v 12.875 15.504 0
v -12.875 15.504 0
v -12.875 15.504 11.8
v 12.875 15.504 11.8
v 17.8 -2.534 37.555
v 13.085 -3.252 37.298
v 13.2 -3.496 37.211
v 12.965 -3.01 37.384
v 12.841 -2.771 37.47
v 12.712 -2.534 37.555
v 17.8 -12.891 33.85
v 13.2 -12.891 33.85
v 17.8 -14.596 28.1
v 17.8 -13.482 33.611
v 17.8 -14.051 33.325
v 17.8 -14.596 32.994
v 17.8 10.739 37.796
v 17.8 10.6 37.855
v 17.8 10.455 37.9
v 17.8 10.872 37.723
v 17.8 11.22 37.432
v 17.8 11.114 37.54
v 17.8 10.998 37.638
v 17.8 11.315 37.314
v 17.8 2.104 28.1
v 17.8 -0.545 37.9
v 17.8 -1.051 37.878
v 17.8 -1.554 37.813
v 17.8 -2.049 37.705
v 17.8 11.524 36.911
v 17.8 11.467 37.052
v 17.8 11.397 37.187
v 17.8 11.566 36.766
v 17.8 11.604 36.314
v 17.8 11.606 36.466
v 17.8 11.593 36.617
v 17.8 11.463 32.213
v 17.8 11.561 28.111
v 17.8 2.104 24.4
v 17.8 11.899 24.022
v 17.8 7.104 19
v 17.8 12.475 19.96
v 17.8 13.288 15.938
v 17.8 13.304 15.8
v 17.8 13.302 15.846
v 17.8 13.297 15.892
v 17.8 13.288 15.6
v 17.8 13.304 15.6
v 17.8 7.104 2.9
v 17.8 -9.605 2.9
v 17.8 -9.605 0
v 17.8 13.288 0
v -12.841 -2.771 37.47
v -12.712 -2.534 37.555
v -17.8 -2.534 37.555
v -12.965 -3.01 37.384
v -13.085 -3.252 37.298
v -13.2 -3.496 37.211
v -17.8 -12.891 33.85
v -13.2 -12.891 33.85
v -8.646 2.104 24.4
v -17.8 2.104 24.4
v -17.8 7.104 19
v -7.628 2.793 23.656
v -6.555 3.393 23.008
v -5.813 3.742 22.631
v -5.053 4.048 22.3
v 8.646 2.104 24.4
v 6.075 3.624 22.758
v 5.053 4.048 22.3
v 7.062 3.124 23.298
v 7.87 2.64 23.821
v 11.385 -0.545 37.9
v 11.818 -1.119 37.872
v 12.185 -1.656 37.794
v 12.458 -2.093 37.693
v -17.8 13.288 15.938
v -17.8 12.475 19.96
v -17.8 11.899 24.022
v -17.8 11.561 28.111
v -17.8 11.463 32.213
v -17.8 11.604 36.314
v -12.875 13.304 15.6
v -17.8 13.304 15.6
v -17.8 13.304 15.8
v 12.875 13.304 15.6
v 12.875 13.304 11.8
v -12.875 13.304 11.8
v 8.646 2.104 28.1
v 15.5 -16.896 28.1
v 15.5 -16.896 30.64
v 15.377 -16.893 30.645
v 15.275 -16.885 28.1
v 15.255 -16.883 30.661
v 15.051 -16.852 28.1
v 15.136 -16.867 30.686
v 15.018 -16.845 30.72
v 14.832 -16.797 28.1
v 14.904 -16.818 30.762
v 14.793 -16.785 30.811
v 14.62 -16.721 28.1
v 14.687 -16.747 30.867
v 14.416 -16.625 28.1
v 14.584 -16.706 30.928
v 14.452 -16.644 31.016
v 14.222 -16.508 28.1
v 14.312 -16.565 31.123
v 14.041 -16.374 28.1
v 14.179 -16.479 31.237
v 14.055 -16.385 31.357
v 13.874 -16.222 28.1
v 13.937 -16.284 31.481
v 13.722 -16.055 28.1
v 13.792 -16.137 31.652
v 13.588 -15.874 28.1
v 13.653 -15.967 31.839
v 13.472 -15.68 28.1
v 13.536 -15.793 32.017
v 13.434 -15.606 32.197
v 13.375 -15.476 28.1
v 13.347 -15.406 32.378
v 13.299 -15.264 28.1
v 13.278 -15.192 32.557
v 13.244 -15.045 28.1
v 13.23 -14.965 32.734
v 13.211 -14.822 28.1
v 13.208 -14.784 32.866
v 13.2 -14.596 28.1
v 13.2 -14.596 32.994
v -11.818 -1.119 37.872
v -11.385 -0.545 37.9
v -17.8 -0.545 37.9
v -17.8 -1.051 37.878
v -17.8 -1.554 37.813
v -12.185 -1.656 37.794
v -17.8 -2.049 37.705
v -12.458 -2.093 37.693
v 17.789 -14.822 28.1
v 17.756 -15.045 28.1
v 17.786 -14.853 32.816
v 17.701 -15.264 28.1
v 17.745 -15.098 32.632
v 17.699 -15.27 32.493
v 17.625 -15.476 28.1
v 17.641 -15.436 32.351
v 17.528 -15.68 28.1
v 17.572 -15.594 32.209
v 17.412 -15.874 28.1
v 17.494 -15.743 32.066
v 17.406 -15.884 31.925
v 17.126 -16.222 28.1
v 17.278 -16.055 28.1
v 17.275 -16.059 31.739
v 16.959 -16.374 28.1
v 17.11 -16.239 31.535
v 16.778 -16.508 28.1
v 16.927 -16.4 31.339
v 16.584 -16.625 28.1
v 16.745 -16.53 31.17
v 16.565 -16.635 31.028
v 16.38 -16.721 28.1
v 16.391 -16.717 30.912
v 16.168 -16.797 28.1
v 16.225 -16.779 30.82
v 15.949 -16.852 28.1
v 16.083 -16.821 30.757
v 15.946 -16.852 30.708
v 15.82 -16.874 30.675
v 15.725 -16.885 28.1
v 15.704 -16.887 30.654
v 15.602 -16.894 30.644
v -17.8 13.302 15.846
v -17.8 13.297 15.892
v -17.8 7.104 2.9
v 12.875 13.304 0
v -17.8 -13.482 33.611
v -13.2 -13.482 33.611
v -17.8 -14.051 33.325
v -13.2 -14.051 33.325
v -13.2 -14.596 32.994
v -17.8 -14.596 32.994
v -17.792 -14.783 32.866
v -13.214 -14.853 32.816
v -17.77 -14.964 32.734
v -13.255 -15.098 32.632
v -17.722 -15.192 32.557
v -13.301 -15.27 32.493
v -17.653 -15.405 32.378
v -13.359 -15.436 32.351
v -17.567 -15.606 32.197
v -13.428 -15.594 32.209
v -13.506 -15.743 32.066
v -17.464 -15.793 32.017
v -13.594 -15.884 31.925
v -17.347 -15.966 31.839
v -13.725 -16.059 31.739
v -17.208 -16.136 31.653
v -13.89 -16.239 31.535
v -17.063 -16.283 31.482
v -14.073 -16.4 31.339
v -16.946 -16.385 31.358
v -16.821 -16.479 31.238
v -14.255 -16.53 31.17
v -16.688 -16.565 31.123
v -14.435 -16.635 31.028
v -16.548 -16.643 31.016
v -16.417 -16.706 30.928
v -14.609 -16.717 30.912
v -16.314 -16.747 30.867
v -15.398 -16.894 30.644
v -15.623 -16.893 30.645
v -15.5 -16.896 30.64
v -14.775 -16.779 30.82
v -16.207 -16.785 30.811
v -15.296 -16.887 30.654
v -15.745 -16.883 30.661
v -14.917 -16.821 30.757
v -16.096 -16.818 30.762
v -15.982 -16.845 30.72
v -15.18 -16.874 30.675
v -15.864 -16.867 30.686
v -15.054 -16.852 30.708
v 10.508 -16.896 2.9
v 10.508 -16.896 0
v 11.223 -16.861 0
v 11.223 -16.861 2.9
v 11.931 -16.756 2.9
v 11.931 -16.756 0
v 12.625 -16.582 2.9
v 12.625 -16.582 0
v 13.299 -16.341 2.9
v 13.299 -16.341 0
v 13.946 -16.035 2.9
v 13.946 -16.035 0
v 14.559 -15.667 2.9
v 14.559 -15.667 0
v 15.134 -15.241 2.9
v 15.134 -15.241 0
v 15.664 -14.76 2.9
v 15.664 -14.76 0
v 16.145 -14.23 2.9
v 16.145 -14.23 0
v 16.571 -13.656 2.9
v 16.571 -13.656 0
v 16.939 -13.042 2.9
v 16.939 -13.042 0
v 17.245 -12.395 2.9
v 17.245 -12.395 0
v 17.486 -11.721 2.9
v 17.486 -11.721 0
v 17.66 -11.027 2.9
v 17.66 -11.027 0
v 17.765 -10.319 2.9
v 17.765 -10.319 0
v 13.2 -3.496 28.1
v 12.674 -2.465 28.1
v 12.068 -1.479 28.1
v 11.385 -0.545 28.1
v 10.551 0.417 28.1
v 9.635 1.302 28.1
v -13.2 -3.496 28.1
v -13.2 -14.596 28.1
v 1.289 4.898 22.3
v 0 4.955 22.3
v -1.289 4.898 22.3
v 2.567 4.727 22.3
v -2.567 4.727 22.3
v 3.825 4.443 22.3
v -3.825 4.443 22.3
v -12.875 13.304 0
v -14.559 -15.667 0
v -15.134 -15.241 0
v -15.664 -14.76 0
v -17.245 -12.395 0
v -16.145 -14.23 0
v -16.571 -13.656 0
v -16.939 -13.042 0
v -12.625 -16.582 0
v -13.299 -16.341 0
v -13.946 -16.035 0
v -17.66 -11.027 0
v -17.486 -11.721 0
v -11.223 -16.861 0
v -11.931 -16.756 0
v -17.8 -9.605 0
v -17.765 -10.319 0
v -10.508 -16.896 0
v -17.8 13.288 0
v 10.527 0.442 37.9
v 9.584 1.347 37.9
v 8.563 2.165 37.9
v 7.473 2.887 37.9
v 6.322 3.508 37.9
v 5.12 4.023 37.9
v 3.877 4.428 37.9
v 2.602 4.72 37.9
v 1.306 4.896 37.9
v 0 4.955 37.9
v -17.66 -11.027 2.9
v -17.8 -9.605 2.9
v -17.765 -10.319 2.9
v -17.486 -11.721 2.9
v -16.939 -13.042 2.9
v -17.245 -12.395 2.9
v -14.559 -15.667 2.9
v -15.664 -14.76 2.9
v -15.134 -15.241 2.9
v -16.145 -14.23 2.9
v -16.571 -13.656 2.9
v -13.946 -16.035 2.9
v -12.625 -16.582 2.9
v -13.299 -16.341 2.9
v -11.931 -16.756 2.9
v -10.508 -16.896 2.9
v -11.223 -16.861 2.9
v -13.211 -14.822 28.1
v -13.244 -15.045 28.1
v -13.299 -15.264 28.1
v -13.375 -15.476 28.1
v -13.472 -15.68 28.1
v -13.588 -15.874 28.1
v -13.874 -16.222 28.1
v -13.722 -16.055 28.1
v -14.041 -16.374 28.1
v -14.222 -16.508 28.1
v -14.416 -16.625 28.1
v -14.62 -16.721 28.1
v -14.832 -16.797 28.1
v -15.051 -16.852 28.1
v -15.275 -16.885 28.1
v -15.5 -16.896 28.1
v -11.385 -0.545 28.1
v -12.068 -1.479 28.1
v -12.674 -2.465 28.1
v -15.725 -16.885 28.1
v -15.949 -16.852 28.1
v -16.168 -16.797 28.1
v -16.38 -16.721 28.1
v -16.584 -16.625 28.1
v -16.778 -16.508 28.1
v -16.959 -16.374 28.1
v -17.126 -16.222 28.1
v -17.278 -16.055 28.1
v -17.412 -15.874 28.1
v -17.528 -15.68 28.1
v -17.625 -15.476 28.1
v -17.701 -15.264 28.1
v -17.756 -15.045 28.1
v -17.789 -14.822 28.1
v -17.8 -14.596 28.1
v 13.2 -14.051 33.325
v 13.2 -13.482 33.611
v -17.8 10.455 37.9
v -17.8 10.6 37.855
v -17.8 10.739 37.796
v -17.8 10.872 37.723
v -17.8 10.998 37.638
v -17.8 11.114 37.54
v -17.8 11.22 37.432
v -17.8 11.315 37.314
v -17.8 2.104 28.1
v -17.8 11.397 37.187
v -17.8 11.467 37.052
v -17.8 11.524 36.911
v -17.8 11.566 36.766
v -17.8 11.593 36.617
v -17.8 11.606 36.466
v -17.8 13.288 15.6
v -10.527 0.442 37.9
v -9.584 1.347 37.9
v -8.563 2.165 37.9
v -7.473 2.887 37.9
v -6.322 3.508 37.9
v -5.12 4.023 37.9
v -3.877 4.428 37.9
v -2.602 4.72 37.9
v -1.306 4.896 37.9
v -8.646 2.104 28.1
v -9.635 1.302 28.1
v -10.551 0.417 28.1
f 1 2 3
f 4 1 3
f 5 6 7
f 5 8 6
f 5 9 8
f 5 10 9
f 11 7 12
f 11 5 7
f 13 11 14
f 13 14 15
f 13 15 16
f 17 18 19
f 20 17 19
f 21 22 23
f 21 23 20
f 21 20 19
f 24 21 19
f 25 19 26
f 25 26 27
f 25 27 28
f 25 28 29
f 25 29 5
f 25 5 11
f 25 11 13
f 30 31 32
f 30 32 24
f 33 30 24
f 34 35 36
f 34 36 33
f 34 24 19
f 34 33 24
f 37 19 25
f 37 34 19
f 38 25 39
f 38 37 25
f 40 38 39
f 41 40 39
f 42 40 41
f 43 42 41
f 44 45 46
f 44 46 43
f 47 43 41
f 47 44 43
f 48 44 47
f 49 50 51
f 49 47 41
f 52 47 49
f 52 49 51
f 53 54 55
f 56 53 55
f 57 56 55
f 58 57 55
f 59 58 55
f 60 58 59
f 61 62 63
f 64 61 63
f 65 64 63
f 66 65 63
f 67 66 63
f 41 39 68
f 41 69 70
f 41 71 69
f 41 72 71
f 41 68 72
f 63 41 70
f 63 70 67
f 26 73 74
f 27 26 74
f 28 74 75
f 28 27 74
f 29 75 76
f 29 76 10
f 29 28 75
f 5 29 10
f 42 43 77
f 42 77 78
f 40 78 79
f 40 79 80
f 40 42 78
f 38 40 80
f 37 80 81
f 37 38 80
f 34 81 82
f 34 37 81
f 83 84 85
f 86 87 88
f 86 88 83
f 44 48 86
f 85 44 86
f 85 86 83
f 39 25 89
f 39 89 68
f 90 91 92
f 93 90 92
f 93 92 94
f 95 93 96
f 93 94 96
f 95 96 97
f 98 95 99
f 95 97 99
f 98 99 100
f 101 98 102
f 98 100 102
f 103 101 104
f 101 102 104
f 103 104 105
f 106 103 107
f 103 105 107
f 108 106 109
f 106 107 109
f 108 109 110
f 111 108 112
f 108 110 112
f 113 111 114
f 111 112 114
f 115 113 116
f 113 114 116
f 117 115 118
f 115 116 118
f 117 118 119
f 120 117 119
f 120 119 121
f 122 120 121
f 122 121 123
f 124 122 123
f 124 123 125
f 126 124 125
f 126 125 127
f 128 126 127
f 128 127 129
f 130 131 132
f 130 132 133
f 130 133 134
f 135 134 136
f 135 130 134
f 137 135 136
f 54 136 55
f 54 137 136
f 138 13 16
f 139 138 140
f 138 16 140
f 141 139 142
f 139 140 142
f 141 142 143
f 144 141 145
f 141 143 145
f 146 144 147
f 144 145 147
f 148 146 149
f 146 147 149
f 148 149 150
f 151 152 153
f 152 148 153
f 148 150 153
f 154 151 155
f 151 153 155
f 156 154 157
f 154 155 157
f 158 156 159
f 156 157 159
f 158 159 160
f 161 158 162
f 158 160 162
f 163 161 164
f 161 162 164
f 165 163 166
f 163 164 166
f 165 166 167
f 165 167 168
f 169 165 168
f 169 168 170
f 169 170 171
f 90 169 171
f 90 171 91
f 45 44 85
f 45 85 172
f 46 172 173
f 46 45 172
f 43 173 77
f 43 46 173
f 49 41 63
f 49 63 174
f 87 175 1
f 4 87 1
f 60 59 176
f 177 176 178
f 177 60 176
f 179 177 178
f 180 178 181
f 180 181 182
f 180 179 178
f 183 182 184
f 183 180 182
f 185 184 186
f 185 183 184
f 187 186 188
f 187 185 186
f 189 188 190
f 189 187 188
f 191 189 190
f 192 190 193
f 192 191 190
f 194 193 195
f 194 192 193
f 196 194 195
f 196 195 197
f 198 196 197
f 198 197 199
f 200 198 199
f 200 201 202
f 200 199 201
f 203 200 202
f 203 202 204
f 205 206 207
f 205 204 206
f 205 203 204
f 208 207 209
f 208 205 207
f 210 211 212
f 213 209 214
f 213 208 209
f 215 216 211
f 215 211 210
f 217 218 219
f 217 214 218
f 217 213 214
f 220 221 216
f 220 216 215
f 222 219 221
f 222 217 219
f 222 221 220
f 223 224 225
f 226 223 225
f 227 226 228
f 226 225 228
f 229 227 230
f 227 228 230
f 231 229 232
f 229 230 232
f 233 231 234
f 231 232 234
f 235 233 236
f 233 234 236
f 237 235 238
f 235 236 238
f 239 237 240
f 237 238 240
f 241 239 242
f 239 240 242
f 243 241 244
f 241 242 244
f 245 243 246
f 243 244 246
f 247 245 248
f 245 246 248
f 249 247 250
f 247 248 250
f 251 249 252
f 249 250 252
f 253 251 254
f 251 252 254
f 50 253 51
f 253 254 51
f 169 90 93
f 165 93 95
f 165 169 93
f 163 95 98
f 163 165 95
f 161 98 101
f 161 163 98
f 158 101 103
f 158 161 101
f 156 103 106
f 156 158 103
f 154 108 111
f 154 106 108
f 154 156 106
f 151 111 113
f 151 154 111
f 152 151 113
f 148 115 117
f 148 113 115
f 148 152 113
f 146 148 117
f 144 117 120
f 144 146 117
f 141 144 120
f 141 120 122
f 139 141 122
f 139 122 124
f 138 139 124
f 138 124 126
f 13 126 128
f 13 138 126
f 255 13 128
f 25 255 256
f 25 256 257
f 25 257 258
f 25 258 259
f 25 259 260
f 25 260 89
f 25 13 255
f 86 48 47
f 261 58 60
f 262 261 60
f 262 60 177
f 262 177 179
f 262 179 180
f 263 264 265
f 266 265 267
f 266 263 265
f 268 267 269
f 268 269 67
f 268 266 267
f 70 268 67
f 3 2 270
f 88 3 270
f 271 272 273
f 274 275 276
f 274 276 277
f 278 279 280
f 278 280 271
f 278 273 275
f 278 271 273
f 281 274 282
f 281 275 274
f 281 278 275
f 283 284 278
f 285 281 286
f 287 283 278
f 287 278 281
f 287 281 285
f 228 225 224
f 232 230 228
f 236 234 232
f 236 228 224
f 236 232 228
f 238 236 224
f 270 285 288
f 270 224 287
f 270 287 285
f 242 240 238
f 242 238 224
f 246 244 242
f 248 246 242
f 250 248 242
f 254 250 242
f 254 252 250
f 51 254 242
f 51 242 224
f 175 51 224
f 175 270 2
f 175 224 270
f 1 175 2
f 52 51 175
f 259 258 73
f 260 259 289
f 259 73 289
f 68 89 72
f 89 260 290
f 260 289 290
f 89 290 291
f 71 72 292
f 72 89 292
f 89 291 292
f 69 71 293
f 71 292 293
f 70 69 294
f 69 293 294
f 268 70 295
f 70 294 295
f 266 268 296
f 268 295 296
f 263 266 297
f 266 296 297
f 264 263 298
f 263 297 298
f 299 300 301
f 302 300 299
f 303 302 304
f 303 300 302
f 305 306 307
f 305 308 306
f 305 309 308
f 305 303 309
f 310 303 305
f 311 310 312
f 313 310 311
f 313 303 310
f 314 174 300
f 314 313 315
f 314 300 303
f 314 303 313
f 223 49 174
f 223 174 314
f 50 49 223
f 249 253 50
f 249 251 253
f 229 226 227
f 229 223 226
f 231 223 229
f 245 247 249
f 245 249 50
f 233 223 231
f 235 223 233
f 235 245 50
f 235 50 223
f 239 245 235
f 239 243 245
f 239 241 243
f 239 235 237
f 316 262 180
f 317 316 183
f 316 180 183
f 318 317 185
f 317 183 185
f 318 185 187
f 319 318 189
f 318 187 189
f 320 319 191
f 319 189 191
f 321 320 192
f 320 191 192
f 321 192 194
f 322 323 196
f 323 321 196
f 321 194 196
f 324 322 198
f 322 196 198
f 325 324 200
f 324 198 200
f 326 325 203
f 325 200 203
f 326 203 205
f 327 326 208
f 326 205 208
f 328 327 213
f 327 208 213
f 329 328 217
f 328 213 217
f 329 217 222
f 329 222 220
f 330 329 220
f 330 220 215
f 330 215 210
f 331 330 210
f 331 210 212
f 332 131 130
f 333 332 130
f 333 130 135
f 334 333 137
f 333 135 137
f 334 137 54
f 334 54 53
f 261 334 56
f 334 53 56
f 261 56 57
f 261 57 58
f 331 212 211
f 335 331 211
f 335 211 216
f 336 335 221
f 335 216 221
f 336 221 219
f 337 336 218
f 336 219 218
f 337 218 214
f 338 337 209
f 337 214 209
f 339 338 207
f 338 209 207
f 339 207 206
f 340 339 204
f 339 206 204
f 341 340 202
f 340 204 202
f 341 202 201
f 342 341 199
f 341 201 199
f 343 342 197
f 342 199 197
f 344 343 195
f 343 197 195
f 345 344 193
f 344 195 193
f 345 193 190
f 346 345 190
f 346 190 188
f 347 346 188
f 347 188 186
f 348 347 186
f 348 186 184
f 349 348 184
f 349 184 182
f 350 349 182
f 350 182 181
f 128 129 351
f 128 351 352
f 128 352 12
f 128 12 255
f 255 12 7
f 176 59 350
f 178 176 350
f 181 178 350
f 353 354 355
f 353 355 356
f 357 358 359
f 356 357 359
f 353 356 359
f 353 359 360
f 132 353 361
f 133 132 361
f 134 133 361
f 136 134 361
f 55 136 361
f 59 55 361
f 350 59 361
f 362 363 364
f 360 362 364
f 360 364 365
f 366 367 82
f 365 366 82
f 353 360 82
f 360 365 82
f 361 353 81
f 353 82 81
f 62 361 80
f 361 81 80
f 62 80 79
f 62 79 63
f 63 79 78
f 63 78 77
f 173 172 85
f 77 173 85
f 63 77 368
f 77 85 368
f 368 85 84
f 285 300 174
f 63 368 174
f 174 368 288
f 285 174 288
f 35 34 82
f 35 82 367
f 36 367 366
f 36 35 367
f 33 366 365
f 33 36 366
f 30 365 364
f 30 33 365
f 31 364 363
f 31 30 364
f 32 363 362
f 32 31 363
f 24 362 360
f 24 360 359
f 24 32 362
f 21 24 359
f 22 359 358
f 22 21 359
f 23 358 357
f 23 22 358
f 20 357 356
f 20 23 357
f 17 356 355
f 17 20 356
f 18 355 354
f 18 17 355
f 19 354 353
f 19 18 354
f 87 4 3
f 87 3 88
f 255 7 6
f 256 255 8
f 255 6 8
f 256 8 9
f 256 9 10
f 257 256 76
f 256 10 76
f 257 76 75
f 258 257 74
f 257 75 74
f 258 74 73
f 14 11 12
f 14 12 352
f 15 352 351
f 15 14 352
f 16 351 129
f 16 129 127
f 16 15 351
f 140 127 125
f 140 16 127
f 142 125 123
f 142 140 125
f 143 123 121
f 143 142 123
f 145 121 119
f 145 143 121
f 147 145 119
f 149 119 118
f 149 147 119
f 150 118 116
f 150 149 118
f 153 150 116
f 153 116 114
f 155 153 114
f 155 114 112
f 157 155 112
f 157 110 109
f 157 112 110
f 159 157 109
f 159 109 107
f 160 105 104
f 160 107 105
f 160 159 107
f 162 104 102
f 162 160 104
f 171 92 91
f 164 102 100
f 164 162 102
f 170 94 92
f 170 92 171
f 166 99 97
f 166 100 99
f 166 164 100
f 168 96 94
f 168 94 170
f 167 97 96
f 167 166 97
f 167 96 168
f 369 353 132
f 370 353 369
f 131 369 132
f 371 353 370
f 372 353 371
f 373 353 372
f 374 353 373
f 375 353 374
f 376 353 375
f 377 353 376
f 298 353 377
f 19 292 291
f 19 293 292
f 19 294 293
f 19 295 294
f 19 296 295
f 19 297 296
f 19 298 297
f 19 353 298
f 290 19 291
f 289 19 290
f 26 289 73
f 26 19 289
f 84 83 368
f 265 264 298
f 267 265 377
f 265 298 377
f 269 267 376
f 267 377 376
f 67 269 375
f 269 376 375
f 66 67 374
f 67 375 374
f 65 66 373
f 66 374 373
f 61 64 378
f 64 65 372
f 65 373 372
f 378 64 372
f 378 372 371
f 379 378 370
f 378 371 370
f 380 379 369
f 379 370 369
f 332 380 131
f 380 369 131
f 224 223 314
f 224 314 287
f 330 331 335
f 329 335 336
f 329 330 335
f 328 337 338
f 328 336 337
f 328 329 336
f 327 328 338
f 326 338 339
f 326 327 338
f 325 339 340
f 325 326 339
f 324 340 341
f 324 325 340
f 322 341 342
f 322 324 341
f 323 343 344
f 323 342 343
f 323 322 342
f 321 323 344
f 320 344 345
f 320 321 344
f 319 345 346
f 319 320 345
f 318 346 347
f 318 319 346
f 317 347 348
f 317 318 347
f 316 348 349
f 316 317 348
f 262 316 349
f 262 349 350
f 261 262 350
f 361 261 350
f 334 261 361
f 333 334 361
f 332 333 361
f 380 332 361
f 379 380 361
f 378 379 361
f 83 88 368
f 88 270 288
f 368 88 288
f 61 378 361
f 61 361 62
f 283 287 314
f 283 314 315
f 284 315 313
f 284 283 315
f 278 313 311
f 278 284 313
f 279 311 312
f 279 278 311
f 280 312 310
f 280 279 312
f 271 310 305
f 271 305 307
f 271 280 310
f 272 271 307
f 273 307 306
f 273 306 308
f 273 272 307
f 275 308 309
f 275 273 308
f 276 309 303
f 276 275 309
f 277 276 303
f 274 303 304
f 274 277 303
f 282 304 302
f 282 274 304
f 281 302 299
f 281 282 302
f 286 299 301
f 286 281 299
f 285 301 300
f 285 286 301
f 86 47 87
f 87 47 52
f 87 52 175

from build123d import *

# Parameters (mm, degrees)
BOSS_EXTRUDE2_DEPTH = 17.8
CUT_EXTRUDE1_DEPTH  = 15.6
CUT_EXTRUDE2_DEPTH  = 15.6


with BuildPart() as part:
    # Sketch2 → Boss-Extrude2 (new, symmetric)
    with BuildSketch(Plane(origin=(0, 0, 0), x_dir=(0, 0, -1), z_dir=(1, 0, 0))):
        with BuildLine():
            Line((0, 15.50389008), (-11.8, 15.50389008))
            Line((-11.8, 15.50389008), (-11.8, 13.30389008))
            Line((-11.8, 13.30389008), (-15.8, 13.30389008))
            ThreePointArc((-15.8, 13.30389008), (-15.869442202, 13.299917081), (-15.937978141, 13.288049932))
            ThreePointArc((-15.937978141, 13.288049932), (-26.064403897, 11.700216575), (-36.314108018, 11.60389008))
            ThreePointArc((-36.314108018, 11.60389008), (-37.313669561, 11.31470673), (-37.9, 10.455074886))
            Line((-37.9, 10.455074886), (-37.9, -0.544925114))
            ThreePointArc((-37.9, -0.544925114), (-37.813111141, -1.55413735), (-37.555001853, -2.533646721))
            Line((-37.555001853, -2.533646721), (-33.85, -12.890912831))
            ThreePointArc((-33.85, -12.890912831), (-32.58061565, -15.162493454), (-30.64, -16.89610992))
            Line((-30.64, -16.89610992), (-28.1, -16.89610992))
            Line((-28.1, -16.89610992), (-28.1, 2.10389008))
            Line((-28.1, 2.10389008), (-24.4, 2.10389008))
            Line((-24.4, 2.10389008), (-19, 7.10389008))
            Line((-19, 7.10389008), (-2.9, 7.10389008))
            Line((-2.9, 7.10389008), (-2.9, -16.89610992))
            Line((-2.9, -16.89610992), (0, -16.89610992))
            Line((0, -16.89610992), (0, 15.50389008))
        make_face()
    extrude(amount=BOSS_EXTRUDE2_DEPTH, both=True)

    # Sketch3 → Cut-Extrude1 (cut)
    with BuildSketch(Plane.XY.offset(37.9)):
        with BuildLine():
            Line((-13.2, -14.59610992), (-13.2, -16.89610992))
            Line((-13.2, -16.89610992), (13.2, -16.89610992))
            Line((13.2, -16.89610992), (13.2, -14.59610992))
            Line((13.2, -14.59610992), (13.2, -3.49610992))
            ThreePointArc((13.2, -3.49610992), (12.380923678, -1.966255492), (11.385353215, -0.544925114))
            Line((11.385353215, -0.544925114), (-11.385353215, -0.544925114))
            ThreePointArc((-11.385353215, -0.544925114), (-12.380923678, -1.966255492), (-13.2, -3.49610992))
            Line((-13.2, -3.49610992), (-13.2, -14.59610992))
        make_face()
        with BuildLine():
            ThreePointArc((0, 4.955074886), (-6.322109375, 3.508041139), (-11.385353215, -0.544925114))
            Line((-11.385353215, -0.544925114), (11.385353215, -0.544925114))
            ThreePointArc((11.385353215, -0.544925114), (6.322109375, 3.508041139), (0, 4.955074886))
        make_face()
        with BuildLine():
            Line((-15.5, -16.89610992), (-13.2, -16.89610992))
            Line((-13.2, -16.89610992), (-13.2, -14.59610992))
            ThreePointArc((-13.2, -14.59610992), (-13.873654403, -16.222455516), (-15.5, -16.89610992))
        make_face()
        with BuildLine():
            Line((-17.8, -16.89610992), (-15.5, -16.89610992))
            ThreePointArc((-15.5, -16.89610992), (-17.126345597, -16.222455516), (-17.8, -14.59610992))
            Line((-17.8, -14.59610992), (-17.8, -16.89610992))
        make_face()
        with BuildLine():
            Line((13.2, -14.59610992), (13.2, -16.89610992))
            Line((13.2, -16.89610992), (15.5, -16.89610992))
            ThreePointArc((15.5, -16.89610992), (13.873654403, -16.222455516), (13.2, -14.59610992))
        make_face()
        with BuildLine():
            ThreePointArc((17.8, -14.59610992), (17.126345597, -16.222455516), (15.5, -16.89610992))
            Line((15.5, -16.89610992), (17.8, -16.89610992))
            Line((17.8, -16.89610992), (17.8, -14.59610992))
        make_face()
    extrude(amount=-CUT_EXTRUDE1_DEPTH, mode=Mode.SUBTRACT)

    # Sketch4 → Cut-Extrude2 (cut)
    with BuildSketch(Plane.XY):
        Polygon((-12.875, 15.50389008), (-12.875, 13.30389008), (-17.8, 13.288049932), (-17.8, 15.50389008), align=None)
        Polygon((12.875, 15.50389008), (17.8, 15.50389008), (17.8, 13.288049932), (12.875, 13.30389008), align=None)
        with BuildLine():
            Line((17.8, -9.604528344), (17.8, -16.89610992))
            Line((17.8, -16.89610992), (10.508418424, -16.89610992))
            ThreePointArc((10.508418424, -16.89610992), (15.664345202, -14.760455122), (17.8, -9.604528344))
        make_face()
        with BuildLine():
            Line((-17.8, -9.604528344), (-17.8, -16.89610992))
            Line((-17.8, -16.89610992), (-10.508418424, -16.89610992))
            ThreePointArc((-10.508418424, -16.89610992), (-15.664345202, -14.760455122), (-17.8, -9.604528344))
        make_face()
    extrude(amount=CUT_EXTRUDE2_DEPTH, mode=Mode.SUBTRACT)


solid = part.part
